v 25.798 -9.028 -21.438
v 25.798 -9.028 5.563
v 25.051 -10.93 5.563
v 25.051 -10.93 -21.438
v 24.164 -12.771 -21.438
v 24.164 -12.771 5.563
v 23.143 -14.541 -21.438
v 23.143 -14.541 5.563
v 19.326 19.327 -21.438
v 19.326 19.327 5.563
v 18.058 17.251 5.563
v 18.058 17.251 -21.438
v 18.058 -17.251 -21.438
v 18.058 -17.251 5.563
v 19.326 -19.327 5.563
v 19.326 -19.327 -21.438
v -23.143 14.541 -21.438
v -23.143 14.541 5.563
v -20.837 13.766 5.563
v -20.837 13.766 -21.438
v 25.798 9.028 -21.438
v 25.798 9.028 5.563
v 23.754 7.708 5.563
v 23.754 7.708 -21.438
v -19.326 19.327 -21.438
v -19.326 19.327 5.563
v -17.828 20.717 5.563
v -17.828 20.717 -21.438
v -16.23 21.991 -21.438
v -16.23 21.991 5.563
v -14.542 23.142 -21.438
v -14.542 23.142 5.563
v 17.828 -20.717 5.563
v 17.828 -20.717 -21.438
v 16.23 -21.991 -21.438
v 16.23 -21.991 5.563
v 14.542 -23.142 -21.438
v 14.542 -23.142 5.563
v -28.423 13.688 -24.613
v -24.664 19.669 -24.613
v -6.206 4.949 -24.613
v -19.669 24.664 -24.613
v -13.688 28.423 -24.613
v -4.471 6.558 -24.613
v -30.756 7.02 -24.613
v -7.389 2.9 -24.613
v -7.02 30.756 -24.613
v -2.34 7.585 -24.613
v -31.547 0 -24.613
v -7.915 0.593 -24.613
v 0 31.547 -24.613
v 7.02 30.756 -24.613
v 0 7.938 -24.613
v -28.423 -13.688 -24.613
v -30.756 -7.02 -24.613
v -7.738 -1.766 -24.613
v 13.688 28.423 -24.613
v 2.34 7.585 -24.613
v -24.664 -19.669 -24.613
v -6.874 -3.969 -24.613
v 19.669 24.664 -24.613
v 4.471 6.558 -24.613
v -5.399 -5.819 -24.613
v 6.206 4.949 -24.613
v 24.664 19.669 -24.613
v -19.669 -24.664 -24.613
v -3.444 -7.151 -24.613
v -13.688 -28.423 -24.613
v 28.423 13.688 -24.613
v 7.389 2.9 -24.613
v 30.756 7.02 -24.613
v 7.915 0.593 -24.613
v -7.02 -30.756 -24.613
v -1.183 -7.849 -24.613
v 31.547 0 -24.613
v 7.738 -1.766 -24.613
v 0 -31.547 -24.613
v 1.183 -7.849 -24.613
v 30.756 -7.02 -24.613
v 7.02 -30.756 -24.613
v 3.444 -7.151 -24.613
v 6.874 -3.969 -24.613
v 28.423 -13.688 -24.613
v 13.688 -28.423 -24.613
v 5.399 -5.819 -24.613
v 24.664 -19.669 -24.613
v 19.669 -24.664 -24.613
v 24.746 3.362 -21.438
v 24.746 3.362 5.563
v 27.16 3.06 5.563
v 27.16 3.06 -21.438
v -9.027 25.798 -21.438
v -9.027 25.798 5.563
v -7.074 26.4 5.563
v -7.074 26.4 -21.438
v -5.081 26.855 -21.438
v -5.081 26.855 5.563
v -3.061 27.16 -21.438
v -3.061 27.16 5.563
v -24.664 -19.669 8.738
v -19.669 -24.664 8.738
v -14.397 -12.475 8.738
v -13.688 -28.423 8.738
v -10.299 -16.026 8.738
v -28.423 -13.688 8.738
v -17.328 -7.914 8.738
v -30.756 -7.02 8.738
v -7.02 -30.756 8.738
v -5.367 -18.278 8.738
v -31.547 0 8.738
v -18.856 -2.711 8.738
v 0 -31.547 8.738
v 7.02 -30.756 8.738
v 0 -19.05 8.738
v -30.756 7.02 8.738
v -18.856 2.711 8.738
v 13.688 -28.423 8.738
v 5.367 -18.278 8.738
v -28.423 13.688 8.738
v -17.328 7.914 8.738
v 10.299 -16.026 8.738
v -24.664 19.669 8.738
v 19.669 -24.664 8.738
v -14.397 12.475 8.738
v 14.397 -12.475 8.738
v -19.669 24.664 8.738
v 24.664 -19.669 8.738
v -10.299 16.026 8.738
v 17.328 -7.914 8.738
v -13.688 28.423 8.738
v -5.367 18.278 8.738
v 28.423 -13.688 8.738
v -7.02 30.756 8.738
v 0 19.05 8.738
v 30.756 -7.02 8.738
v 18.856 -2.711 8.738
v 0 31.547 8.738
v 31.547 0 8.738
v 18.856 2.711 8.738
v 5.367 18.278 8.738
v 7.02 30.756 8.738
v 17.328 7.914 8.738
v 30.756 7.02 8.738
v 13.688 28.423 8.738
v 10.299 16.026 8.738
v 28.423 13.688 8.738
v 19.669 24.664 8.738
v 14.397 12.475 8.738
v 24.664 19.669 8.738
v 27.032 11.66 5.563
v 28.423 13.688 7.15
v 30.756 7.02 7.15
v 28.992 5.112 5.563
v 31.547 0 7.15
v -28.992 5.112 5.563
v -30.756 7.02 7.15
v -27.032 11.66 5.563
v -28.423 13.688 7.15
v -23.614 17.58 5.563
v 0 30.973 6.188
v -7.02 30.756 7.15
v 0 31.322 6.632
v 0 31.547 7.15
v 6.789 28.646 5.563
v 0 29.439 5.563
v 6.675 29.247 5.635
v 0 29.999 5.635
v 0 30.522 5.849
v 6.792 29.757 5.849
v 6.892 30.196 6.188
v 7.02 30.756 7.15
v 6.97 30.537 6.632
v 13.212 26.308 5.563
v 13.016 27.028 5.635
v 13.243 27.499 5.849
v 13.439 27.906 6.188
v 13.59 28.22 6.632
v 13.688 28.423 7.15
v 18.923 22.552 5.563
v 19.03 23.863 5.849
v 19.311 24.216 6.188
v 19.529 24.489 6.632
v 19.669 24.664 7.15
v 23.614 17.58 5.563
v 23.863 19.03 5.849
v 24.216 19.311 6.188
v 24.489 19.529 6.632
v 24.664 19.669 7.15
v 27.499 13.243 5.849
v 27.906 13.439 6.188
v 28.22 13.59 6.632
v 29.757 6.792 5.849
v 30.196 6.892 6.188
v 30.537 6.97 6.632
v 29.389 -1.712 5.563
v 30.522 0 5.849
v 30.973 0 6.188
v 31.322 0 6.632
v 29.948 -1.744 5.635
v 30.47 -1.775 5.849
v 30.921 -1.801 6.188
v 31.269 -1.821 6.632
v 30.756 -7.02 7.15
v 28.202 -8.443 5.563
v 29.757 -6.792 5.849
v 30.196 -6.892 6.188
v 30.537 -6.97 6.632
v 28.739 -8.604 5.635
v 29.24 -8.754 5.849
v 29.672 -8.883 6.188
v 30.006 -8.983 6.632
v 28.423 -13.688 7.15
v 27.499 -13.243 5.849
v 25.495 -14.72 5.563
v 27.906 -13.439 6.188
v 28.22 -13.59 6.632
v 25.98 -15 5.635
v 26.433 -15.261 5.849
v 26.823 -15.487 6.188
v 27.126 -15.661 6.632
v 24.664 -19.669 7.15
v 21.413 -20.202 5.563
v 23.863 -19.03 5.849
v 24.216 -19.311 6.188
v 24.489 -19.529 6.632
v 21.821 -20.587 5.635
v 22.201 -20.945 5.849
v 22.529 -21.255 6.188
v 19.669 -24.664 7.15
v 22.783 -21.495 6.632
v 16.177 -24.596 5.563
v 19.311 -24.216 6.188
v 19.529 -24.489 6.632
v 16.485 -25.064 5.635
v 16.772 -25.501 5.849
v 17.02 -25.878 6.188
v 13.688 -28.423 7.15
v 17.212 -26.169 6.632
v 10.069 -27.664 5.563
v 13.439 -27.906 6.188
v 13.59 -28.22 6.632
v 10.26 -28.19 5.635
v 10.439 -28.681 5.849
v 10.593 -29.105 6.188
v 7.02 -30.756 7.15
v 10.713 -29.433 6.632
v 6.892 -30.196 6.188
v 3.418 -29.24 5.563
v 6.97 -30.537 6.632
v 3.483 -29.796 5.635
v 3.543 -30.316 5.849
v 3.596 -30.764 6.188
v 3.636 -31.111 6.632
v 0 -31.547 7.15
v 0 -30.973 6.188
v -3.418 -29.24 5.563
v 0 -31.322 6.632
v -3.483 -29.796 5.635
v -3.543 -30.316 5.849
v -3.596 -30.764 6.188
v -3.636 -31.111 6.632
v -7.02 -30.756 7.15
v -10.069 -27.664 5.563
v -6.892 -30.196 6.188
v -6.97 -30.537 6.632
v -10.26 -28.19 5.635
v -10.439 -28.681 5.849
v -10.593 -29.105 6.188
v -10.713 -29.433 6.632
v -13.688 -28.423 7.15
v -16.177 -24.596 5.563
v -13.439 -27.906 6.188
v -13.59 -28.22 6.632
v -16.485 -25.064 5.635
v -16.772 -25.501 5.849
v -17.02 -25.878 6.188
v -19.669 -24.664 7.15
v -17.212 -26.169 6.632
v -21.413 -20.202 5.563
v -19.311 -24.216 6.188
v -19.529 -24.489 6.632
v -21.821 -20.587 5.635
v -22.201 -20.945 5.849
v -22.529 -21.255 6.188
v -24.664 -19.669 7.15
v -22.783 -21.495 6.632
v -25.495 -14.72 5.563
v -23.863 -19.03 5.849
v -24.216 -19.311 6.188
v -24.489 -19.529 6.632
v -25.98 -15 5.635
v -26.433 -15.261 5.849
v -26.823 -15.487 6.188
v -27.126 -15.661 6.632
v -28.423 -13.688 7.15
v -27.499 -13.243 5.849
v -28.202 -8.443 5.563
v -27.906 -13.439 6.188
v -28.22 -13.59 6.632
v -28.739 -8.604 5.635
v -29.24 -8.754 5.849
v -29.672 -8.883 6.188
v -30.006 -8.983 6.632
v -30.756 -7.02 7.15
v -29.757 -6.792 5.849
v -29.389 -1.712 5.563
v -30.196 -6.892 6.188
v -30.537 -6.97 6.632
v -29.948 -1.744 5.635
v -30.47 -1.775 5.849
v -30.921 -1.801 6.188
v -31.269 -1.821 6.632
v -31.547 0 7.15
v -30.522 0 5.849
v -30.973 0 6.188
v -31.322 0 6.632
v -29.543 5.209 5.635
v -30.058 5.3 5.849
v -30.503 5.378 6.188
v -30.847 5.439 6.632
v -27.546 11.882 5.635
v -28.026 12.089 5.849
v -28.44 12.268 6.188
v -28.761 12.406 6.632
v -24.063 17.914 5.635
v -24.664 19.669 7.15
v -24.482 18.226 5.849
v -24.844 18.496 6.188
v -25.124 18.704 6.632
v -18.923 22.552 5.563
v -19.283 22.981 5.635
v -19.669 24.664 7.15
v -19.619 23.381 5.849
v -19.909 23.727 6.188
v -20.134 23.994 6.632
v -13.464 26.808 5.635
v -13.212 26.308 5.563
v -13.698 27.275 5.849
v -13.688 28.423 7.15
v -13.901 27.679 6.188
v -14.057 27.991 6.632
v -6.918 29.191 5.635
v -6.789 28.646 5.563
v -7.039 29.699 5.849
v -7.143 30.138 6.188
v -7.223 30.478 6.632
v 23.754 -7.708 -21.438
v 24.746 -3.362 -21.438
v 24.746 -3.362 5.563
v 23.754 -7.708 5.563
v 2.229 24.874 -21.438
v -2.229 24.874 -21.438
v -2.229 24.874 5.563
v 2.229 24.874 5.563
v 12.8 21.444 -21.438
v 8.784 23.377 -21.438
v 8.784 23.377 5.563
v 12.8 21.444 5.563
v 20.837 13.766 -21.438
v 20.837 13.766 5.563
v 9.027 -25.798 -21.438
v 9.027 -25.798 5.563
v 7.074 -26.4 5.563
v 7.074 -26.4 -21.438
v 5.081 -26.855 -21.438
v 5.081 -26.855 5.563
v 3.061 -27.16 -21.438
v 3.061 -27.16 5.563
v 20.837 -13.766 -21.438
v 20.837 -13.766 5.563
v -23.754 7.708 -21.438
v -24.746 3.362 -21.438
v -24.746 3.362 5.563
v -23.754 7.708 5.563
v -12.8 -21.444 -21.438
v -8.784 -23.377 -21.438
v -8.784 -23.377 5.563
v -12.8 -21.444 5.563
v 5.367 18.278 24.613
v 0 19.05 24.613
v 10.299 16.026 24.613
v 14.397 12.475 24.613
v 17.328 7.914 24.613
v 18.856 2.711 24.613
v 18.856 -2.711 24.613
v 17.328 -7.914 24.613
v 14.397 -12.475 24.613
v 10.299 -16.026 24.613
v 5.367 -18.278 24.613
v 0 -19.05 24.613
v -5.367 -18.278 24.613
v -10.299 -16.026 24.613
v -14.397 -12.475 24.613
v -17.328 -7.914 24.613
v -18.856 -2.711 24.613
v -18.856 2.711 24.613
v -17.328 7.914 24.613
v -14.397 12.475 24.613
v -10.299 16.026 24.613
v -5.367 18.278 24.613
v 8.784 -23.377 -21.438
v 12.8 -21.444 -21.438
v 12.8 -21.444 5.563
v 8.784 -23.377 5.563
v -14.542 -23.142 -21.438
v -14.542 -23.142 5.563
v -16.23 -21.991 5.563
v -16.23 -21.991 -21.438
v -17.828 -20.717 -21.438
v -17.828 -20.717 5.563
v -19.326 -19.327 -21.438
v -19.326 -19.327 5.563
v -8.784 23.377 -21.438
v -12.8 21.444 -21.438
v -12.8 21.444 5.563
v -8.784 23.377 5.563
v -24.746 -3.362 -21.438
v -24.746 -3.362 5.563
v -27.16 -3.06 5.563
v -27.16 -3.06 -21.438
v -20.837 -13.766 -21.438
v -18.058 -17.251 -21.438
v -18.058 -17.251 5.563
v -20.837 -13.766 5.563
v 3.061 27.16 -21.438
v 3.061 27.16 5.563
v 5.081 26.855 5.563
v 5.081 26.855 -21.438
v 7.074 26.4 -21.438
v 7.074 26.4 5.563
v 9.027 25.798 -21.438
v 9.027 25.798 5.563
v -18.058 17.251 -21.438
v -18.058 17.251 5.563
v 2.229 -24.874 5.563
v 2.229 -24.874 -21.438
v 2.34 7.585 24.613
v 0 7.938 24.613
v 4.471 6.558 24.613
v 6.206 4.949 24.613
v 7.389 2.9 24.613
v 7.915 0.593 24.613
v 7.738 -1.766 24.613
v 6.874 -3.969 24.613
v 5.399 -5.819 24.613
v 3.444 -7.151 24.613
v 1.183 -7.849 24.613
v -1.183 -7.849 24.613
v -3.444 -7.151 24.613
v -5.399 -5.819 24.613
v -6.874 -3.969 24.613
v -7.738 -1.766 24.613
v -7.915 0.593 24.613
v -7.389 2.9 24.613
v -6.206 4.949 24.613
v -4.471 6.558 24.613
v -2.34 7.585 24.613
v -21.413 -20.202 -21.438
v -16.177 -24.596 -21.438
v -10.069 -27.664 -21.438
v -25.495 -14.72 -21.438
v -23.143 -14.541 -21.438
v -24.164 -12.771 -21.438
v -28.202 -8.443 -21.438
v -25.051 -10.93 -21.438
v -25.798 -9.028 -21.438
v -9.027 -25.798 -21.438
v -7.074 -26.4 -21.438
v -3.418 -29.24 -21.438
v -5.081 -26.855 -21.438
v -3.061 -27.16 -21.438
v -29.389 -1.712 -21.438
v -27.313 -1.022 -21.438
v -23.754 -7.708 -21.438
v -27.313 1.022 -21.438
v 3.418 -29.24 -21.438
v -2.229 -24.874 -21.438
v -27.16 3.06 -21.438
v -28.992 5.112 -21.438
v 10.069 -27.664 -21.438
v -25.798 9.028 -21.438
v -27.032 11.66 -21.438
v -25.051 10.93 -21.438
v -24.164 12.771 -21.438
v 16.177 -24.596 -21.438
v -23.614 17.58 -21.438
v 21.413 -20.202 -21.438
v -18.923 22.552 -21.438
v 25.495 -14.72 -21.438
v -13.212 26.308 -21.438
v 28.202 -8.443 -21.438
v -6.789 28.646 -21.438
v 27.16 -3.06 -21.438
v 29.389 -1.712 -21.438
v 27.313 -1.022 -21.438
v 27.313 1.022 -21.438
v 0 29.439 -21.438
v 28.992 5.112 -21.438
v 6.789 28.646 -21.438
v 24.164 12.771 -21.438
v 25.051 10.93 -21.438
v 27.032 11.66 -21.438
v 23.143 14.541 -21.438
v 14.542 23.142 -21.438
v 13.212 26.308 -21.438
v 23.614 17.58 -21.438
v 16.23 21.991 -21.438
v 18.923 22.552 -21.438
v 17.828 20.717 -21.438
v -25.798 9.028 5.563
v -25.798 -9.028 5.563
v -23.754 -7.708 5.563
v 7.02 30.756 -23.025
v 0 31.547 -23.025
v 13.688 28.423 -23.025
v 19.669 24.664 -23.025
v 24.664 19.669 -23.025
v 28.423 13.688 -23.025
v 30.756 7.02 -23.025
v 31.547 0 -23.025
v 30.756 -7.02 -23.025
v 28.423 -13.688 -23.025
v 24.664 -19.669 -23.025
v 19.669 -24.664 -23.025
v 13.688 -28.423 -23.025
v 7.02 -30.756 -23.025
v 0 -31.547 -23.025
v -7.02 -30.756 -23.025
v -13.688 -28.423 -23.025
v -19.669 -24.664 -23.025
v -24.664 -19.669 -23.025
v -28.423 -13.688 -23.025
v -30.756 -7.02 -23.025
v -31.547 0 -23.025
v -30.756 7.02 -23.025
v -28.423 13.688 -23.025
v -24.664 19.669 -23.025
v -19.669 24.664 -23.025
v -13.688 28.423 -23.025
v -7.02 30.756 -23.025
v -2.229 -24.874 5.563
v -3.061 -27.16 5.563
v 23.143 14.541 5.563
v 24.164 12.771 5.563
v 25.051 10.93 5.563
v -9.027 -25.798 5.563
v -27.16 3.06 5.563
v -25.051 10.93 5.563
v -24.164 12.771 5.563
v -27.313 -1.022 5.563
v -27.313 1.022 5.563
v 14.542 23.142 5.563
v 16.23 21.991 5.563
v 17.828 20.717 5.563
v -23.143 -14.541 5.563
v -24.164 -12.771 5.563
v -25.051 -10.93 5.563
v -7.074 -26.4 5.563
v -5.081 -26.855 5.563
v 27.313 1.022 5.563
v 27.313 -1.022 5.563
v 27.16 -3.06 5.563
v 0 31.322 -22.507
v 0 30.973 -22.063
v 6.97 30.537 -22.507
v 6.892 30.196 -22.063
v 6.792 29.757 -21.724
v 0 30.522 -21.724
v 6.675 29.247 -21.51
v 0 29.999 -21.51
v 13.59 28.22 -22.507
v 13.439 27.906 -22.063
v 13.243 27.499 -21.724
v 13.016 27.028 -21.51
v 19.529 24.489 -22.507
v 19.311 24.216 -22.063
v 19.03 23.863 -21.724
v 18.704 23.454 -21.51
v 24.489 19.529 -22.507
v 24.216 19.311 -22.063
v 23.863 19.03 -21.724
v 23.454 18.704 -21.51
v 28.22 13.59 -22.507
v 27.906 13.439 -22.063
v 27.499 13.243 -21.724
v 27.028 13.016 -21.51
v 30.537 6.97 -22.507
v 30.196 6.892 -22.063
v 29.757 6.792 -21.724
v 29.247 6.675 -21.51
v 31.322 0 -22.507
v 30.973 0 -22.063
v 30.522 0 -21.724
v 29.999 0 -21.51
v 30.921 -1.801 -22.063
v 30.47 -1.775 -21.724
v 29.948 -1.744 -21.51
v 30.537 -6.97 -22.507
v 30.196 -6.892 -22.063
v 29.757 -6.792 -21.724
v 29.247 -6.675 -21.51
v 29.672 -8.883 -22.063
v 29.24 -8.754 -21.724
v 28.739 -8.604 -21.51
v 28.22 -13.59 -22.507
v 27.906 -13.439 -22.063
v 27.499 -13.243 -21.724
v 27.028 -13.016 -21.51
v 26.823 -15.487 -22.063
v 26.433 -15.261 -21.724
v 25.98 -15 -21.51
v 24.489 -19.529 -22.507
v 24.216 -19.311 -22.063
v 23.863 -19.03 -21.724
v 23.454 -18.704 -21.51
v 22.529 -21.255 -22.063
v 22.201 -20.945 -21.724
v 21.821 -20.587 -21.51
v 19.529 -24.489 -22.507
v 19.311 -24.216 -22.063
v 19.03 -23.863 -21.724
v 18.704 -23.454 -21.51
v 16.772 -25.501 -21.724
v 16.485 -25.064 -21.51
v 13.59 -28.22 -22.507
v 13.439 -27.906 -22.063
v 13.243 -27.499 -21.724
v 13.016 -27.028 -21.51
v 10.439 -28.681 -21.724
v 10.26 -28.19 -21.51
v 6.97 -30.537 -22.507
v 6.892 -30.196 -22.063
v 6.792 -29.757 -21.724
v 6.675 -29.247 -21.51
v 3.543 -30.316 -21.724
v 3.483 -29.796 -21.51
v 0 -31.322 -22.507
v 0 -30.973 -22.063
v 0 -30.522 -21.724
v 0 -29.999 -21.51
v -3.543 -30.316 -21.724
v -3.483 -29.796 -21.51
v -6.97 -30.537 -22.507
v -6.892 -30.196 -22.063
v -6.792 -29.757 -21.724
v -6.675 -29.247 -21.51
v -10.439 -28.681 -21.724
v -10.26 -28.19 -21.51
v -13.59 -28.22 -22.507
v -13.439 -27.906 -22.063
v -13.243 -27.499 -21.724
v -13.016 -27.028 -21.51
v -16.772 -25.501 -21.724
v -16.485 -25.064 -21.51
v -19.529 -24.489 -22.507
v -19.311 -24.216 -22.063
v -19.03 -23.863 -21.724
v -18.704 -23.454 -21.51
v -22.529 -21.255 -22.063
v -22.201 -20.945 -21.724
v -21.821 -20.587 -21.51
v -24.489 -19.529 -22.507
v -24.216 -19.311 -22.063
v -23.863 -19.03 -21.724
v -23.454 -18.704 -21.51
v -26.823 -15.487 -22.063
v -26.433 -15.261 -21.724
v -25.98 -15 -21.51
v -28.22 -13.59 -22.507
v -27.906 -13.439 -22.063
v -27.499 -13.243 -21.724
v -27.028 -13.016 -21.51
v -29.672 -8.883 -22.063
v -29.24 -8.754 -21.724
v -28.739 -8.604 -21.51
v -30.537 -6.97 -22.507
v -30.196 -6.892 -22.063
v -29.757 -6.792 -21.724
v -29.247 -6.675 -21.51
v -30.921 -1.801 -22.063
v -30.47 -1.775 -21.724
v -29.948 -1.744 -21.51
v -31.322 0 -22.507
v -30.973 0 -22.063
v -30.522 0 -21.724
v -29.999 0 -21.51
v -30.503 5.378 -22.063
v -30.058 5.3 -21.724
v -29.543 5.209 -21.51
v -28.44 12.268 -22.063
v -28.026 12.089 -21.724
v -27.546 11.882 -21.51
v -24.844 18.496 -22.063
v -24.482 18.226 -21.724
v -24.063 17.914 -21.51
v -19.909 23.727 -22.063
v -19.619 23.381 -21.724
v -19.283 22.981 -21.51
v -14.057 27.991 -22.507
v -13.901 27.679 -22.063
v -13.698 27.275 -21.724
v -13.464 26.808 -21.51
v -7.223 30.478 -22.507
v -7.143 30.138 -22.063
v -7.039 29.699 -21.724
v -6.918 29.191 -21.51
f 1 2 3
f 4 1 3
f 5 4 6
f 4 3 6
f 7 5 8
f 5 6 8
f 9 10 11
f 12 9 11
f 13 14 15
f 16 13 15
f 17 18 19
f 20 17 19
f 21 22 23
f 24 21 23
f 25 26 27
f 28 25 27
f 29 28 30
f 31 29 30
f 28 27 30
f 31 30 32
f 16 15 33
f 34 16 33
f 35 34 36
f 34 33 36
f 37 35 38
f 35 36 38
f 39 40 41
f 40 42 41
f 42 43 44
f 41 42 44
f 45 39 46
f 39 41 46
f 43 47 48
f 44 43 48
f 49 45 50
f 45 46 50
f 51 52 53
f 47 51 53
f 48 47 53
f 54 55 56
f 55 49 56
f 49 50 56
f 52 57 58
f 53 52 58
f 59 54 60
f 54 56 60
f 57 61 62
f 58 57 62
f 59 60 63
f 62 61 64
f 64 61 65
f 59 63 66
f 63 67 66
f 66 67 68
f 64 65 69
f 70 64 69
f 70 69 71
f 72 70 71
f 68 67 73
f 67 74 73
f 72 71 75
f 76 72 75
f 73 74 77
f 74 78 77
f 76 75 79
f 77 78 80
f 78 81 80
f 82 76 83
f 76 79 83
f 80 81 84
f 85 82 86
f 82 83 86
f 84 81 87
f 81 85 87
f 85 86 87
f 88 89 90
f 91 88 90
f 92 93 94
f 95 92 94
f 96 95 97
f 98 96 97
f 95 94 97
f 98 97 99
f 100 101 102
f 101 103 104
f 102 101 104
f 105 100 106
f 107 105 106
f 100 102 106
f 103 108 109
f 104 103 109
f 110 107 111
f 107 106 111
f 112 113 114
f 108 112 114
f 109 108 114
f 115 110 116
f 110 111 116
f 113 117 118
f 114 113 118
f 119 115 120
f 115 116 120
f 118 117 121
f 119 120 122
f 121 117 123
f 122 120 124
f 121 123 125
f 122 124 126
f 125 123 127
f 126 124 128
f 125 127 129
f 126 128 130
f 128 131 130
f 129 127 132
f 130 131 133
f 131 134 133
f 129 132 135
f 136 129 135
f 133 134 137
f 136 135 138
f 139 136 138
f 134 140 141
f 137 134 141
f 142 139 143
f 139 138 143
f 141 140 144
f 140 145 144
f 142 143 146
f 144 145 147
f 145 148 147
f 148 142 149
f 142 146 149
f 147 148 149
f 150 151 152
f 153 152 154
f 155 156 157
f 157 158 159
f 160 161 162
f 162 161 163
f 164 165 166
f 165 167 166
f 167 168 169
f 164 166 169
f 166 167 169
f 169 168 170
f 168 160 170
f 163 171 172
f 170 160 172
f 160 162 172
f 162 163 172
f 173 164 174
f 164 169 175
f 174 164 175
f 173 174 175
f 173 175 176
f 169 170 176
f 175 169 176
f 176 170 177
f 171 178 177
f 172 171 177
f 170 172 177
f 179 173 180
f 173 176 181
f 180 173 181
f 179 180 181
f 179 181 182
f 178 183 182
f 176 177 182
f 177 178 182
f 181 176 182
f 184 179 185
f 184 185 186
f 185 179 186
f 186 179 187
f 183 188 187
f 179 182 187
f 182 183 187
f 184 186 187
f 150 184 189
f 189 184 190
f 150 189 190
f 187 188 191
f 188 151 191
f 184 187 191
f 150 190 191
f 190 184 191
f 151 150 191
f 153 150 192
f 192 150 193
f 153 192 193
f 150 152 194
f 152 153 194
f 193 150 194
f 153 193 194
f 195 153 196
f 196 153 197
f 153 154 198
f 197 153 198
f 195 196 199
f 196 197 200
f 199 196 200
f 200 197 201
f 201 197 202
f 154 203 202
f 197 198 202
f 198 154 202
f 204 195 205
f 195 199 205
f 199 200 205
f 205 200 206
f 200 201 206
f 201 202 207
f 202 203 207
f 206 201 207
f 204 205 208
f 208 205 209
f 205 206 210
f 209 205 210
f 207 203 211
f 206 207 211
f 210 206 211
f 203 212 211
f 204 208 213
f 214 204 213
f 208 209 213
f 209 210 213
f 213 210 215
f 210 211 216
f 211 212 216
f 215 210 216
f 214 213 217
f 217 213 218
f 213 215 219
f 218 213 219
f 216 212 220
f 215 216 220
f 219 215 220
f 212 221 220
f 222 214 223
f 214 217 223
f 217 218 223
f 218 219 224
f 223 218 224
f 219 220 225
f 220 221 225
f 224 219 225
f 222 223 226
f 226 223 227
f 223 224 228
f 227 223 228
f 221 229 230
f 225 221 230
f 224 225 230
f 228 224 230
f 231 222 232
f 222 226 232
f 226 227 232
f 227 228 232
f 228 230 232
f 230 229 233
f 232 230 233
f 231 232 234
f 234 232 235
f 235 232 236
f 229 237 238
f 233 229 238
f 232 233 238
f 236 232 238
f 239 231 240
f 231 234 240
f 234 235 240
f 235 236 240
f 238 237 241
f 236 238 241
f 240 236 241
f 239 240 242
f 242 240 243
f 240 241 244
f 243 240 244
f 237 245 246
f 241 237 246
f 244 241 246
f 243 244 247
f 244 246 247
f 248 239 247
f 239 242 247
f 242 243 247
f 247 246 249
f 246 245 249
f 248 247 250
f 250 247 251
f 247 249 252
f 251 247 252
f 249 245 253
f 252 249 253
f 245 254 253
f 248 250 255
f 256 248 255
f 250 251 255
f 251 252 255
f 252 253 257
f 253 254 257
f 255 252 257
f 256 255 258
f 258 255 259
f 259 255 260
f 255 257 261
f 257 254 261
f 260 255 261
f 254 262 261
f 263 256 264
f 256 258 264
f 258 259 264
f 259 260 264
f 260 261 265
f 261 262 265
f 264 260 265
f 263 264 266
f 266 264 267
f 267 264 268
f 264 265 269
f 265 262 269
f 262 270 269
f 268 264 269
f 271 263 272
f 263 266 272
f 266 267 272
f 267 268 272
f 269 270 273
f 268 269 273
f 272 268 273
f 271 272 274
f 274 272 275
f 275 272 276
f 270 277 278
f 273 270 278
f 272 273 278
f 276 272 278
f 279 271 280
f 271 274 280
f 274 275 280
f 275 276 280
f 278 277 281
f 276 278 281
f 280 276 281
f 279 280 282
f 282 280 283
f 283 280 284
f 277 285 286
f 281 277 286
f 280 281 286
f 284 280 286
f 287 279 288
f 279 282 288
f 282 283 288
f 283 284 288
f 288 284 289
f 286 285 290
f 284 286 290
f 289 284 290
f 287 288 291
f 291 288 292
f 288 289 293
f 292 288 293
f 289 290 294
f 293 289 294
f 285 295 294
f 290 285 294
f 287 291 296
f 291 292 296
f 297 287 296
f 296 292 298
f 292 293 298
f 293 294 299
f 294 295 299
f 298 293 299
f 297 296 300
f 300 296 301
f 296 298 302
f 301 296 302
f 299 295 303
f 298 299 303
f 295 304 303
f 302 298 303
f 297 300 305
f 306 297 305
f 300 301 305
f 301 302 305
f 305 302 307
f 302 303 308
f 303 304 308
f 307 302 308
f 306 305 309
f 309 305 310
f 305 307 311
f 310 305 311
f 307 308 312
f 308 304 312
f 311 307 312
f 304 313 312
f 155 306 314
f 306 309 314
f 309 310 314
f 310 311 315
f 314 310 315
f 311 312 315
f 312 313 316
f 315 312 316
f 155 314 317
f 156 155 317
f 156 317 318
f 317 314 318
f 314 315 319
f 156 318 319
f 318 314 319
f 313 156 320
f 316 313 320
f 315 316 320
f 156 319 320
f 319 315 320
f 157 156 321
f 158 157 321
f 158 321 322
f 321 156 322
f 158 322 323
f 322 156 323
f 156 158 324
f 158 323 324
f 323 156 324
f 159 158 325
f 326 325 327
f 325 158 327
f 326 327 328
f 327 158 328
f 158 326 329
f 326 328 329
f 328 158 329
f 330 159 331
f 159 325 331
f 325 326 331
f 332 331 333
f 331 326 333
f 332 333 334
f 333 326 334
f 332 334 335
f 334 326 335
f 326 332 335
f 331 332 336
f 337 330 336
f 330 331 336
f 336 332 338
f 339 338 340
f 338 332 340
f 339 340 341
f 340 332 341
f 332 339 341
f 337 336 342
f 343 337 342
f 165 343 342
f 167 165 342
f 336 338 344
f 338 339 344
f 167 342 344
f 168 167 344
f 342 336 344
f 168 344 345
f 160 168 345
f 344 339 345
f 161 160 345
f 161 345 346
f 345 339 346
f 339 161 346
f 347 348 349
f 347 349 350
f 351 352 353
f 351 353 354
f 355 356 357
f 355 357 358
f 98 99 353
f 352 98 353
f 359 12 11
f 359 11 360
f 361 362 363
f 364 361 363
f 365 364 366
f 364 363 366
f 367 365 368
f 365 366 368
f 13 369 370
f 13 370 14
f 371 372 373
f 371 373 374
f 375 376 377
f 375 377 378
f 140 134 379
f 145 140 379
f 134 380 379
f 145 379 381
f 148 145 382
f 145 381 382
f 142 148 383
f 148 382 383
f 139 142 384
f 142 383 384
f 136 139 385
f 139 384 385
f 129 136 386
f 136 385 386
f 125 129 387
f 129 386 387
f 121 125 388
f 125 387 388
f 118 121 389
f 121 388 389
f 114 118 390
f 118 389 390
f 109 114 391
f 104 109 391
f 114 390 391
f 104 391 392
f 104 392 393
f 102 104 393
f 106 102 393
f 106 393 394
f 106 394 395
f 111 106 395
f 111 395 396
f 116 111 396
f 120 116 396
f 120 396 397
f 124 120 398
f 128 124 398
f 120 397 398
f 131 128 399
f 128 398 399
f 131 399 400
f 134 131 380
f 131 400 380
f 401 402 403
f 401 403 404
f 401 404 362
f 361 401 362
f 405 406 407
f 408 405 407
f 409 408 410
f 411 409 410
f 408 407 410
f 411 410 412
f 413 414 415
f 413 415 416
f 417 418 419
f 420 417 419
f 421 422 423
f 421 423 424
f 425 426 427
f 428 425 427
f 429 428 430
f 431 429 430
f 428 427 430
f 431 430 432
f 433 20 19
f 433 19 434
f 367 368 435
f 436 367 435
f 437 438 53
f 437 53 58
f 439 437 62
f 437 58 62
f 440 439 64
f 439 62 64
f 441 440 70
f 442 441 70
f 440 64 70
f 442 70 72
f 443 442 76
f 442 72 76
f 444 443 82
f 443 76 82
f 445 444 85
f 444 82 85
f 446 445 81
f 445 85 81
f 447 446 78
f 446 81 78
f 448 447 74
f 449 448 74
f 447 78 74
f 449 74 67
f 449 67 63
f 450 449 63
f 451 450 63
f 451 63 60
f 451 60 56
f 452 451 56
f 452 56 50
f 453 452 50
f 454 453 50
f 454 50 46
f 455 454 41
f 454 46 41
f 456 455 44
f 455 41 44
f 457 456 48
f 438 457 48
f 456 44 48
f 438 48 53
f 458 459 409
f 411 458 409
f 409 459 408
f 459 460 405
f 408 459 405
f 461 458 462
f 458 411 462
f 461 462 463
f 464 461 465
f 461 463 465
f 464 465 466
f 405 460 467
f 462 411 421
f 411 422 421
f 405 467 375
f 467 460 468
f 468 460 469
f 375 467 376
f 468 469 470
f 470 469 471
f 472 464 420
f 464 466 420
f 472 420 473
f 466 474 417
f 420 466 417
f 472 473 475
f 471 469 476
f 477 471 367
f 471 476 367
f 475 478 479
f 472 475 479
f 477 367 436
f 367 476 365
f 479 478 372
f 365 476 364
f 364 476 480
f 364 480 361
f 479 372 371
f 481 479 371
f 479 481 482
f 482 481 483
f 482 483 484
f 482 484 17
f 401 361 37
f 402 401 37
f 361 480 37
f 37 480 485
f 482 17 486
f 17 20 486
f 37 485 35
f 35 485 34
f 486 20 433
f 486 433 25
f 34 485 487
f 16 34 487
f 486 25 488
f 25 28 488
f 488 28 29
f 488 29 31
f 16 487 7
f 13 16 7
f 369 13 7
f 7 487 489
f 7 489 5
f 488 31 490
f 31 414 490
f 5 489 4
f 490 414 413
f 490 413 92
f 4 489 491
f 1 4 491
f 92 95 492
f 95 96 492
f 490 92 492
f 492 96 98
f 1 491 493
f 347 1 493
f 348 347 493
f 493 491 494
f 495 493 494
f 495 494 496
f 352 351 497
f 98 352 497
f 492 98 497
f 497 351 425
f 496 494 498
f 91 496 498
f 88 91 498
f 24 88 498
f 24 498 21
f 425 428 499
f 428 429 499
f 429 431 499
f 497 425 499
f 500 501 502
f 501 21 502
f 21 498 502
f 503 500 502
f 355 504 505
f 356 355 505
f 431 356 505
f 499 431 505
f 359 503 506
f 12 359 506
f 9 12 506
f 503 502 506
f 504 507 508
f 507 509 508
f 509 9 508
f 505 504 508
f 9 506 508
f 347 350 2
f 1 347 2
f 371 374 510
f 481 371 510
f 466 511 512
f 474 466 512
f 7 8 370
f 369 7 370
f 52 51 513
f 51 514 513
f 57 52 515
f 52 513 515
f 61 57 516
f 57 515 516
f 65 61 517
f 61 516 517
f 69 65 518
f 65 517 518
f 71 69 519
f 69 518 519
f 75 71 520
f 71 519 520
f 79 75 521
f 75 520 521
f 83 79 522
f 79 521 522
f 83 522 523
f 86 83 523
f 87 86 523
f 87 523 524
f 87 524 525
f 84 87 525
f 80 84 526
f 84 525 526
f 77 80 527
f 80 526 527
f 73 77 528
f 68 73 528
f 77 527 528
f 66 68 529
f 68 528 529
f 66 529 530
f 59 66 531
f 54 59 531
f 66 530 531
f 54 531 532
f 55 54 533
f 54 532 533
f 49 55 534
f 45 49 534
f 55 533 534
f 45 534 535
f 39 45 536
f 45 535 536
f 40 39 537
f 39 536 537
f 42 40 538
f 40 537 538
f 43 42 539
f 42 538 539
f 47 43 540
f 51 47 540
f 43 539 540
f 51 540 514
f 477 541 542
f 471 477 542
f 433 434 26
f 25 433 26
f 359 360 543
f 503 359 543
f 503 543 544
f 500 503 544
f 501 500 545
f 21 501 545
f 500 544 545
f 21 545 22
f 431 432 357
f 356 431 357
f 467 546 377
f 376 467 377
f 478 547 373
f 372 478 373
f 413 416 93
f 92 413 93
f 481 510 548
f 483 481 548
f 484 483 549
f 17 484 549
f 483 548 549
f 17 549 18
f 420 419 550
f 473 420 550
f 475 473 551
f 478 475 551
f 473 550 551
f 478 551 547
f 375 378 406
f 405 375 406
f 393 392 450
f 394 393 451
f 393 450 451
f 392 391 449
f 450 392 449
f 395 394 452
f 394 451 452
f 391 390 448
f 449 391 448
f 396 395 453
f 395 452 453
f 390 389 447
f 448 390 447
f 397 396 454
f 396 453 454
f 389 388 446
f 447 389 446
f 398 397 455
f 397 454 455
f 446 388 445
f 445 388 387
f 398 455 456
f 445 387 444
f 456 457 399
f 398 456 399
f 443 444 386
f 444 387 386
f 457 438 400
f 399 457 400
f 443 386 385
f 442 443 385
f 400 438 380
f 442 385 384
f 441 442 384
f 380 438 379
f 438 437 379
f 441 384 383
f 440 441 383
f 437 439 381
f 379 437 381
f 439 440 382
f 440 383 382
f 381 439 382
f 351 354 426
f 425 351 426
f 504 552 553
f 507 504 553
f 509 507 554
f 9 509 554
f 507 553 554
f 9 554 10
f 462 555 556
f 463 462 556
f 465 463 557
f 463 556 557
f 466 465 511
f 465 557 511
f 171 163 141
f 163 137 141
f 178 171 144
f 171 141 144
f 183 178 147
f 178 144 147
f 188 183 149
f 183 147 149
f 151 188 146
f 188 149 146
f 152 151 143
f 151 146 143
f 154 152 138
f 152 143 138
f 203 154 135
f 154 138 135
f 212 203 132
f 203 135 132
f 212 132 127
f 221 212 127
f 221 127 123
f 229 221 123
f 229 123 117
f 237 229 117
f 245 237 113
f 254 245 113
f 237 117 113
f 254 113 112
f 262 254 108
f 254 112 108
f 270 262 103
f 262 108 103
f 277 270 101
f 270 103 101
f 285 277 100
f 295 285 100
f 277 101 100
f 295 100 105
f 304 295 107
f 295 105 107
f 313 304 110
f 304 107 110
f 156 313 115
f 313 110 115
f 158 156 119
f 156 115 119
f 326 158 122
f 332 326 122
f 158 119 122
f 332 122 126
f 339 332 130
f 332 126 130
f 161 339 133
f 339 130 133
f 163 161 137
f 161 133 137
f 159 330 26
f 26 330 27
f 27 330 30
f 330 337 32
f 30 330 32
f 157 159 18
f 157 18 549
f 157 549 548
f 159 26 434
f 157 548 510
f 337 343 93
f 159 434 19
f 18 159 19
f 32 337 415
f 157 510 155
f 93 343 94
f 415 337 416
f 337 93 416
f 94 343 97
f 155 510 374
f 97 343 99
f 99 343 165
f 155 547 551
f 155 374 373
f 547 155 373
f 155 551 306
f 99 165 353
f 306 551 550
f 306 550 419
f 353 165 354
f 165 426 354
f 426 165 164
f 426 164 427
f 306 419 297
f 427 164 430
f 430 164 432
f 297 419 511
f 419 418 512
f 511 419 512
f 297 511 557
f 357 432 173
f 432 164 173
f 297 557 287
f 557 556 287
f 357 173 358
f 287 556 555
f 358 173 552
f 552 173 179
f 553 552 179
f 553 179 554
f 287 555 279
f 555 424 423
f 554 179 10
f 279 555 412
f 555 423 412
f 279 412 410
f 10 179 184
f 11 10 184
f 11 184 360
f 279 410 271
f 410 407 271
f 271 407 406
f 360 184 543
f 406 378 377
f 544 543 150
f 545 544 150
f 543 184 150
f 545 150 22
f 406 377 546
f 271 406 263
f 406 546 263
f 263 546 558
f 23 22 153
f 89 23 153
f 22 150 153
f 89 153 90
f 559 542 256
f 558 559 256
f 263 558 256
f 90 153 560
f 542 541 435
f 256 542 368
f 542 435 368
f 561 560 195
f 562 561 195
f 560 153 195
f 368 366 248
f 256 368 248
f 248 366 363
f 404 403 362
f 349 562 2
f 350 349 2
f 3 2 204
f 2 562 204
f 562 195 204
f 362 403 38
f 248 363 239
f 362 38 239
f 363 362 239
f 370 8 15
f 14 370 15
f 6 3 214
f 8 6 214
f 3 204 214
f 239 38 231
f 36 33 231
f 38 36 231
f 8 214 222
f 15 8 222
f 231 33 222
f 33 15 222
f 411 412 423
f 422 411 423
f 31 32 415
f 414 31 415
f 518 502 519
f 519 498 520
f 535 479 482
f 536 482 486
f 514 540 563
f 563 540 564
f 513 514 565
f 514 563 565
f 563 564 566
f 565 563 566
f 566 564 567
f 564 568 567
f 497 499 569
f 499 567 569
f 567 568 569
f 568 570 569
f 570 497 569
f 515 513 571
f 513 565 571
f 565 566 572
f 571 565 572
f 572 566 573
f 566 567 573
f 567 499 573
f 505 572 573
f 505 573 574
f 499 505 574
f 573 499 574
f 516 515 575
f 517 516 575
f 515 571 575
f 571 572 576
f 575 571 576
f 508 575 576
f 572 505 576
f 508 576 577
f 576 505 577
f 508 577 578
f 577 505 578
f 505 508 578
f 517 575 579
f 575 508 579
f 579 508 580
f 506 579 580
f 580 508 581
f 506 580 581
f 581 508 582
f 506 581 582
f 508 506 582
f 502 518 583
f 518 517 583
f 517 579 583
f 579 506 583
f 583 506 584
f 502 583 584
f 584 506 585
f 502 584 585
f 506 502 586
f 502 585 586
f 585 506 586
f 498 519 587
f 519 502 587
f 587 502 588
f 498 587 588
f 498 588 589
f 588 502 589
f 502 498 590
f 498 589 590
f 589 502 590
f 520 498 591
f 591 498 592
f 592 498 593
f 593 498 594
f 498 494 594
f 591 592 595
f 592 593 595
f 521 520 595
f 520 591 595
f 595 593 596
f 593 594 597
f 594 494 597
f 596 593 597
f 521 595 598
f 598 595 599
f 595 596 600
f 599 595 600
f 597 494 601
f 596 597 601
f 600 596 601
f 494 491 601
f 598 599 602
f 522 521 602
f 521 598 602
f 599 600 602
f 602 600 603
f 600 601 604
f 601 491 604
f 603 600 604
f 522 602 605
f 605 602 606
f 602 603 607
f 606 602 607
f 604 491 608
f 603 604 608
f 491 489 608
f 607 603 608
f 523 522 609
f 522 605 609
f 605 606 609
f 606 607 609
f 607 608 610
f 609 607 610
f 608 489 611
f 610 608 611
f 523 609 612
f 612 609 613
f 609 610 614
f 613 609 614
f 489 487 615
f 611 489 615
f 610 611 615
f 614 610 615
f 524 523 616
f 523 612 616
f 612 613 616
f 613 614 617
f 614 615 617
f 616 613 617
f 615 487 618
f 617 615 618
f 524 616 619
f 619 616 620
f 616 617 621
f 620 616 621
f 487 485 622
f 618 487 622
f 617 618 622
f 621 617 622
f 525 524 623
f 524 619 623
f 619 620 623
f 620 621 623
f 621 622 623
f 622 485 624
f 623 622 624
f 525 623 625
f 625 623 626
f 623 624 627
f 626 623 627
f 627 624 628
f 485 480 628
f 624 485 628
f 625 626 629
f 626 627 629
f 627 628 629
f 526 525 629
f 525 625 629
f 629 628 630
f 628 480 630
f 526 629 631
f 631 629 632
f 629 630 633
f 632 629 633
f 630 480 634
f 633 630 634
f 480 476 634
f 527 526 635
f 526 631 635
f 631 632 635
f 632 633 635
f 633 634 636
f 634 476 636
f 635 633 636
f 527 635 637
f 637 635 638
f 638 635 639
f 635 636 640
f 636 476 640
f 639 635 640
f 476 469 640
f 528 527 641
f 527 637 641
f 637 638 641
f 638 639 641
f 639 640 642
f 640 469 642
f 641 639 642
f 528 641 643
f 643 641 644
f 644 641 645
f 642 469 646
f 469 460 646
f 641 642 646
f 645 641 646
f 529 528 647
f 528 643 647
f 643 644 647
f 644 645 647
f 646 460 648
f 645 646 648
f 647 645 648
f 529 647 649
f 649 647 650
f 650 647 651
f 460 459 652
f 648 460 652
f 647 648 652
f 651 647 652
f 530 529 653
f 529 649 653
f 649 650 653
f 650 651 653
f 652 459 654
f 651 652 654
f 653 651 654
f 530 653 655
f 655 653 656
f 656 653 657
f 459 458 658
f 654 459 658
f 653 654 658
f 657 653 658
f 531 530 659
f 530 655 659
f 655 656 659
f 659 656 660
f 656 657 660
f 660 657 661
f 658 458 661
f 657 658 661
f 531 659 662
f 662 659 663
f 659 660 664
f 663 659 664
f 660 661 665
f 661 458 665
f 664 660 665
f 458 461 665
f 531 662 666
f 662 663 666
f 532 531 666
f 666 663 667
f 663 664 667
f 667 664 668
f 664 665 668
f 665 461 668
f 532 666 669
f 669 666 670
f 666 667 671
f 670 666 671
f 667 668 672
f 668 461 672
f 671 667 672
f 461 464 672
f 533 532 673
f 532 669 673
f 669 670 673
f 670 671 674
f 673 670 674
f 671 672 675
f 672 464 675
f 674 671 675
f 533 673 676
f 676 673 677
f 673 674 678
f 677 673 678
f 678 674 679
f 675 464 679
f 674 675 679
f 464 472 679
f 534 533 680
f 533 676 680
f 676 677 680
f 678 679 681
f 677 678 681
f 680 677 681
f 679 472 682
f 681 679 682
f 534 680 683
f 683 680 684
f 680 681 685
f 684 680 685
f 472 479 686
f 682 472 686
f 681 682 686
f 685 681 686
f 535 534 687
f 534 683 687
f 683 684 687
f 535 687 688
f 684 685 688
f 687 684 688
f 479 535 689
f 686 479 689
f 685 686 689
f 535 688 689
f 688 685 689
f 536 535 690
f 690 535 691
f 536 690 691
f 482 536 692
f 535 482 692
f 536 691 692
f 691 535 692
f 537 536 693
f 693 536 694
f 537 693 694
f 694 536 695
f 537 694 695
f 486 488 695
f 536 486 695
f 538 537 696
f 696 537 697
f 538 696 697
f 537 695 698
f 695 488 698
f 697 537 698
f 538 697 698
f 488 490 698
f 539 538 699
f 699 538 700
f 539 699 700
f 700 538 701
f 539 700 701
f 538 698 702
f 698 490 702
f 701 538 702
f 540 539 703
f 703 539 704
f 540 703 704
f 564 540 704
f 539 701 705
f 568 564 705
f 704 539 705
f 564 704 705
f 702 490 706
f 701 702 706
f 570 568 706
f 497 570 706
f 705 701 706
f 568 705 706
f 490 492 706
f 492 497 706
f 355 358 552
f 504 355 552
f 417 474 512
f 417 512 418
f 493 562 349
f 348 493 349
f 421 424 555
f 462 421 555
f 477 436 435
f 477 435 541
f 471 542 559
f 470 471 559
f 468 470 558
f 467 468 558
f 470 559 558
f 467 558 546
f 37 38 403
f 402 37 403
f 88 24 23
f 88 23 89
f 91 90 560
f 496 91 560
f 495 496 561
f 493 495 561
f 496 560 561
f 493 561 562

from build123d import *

# Parameters (mm, degrees)
CUT_EXTRUDE1_START = 5.5626
CUT_EXTRUDE1_DEPTH = 27.0002
CIRPATTERN1_COUNT  = 14


with BuildPart() as part:
    # Sketch2 → Revolve1 (revolve)
    with BuildSketch(Plane(origin=(0, 0, 0), x_dir=(0, 0, -1), z_dir=(1, 0, 0))):
        with BuildLine():
            Line((-24.6126, 7.9375), (24.6126, 7.9375))
            Line((24.6126, 7.9375), (24.6126, 31.5468))
            Line((24.6126, 31.5468), (23.0251, 31.5468))
            ThreePointArc((23.0251, 31.5468), (21.87887746, 30.758520647), (21.4376, 29.439246357))
            Line((21.4376, 29.439246357), (21.4376, 27.331692713))
            Line((21.4376, 27.331692713), (-5.5626, 27.331692713))
            Line((-5.5626, 27.331692713), (-5.5626, 29.439246357))
            ThreePointArc((-5.5626, 29.439246357), (-6.00387746, 30.758520647), (-7.1501, 31.5468))
            Line((-7.1501, 31.5468), (-8.7376, 31.5468))
            Line((-8.7376, 31.5468), (-8.7376, 19.05))
            Line((-8.7376, 19.05), (-24.6126, 19.05))
            Line((-24.6126, 19.05), (-24.6126, 7.9375))
        make_face()
    revolve(axis=Axis((0, 0, 24.6126), (0, 0, -1)))

    # Sketch3 → Cut-Extrude1 (cut)
    with BuildSketch(Plane.XY.offset(CUT_EXTRUDE1_START)):
        with BuildLine():
            Line((-2.228664044, 24.87377802), (2.228664044, 24.87377802))
            Line((2.228664044, 24.87377802), (3.0607, 27.15977802))
            ThreePointArc((3.0607, 27.15977802), (0, 27.331692713), (-3.0607, 27.15977802))
            Line((-3.0607, 27.15977802), (-2.228664044, 24.87377802))
        make_face()
    cut_extrude1 = extrude(amount=-CUT_EXTRUDE1_DEPTH, mode=Mode.SUBTRACT)

    # CirPattern1: Cut-Extrude1 ×14 about axis
    cirpattern1_axis = Axis((0, 0, 0), (0, 0, 1))
    for i in range(1, CIRPATTERN1_COUNT):
        add(cut_extrude1.rotate(cirpattern1_axis, i * 360 / CIRPATTERN1_COUNT), mode=Mode.SUBTRACT)


solid = part.part
